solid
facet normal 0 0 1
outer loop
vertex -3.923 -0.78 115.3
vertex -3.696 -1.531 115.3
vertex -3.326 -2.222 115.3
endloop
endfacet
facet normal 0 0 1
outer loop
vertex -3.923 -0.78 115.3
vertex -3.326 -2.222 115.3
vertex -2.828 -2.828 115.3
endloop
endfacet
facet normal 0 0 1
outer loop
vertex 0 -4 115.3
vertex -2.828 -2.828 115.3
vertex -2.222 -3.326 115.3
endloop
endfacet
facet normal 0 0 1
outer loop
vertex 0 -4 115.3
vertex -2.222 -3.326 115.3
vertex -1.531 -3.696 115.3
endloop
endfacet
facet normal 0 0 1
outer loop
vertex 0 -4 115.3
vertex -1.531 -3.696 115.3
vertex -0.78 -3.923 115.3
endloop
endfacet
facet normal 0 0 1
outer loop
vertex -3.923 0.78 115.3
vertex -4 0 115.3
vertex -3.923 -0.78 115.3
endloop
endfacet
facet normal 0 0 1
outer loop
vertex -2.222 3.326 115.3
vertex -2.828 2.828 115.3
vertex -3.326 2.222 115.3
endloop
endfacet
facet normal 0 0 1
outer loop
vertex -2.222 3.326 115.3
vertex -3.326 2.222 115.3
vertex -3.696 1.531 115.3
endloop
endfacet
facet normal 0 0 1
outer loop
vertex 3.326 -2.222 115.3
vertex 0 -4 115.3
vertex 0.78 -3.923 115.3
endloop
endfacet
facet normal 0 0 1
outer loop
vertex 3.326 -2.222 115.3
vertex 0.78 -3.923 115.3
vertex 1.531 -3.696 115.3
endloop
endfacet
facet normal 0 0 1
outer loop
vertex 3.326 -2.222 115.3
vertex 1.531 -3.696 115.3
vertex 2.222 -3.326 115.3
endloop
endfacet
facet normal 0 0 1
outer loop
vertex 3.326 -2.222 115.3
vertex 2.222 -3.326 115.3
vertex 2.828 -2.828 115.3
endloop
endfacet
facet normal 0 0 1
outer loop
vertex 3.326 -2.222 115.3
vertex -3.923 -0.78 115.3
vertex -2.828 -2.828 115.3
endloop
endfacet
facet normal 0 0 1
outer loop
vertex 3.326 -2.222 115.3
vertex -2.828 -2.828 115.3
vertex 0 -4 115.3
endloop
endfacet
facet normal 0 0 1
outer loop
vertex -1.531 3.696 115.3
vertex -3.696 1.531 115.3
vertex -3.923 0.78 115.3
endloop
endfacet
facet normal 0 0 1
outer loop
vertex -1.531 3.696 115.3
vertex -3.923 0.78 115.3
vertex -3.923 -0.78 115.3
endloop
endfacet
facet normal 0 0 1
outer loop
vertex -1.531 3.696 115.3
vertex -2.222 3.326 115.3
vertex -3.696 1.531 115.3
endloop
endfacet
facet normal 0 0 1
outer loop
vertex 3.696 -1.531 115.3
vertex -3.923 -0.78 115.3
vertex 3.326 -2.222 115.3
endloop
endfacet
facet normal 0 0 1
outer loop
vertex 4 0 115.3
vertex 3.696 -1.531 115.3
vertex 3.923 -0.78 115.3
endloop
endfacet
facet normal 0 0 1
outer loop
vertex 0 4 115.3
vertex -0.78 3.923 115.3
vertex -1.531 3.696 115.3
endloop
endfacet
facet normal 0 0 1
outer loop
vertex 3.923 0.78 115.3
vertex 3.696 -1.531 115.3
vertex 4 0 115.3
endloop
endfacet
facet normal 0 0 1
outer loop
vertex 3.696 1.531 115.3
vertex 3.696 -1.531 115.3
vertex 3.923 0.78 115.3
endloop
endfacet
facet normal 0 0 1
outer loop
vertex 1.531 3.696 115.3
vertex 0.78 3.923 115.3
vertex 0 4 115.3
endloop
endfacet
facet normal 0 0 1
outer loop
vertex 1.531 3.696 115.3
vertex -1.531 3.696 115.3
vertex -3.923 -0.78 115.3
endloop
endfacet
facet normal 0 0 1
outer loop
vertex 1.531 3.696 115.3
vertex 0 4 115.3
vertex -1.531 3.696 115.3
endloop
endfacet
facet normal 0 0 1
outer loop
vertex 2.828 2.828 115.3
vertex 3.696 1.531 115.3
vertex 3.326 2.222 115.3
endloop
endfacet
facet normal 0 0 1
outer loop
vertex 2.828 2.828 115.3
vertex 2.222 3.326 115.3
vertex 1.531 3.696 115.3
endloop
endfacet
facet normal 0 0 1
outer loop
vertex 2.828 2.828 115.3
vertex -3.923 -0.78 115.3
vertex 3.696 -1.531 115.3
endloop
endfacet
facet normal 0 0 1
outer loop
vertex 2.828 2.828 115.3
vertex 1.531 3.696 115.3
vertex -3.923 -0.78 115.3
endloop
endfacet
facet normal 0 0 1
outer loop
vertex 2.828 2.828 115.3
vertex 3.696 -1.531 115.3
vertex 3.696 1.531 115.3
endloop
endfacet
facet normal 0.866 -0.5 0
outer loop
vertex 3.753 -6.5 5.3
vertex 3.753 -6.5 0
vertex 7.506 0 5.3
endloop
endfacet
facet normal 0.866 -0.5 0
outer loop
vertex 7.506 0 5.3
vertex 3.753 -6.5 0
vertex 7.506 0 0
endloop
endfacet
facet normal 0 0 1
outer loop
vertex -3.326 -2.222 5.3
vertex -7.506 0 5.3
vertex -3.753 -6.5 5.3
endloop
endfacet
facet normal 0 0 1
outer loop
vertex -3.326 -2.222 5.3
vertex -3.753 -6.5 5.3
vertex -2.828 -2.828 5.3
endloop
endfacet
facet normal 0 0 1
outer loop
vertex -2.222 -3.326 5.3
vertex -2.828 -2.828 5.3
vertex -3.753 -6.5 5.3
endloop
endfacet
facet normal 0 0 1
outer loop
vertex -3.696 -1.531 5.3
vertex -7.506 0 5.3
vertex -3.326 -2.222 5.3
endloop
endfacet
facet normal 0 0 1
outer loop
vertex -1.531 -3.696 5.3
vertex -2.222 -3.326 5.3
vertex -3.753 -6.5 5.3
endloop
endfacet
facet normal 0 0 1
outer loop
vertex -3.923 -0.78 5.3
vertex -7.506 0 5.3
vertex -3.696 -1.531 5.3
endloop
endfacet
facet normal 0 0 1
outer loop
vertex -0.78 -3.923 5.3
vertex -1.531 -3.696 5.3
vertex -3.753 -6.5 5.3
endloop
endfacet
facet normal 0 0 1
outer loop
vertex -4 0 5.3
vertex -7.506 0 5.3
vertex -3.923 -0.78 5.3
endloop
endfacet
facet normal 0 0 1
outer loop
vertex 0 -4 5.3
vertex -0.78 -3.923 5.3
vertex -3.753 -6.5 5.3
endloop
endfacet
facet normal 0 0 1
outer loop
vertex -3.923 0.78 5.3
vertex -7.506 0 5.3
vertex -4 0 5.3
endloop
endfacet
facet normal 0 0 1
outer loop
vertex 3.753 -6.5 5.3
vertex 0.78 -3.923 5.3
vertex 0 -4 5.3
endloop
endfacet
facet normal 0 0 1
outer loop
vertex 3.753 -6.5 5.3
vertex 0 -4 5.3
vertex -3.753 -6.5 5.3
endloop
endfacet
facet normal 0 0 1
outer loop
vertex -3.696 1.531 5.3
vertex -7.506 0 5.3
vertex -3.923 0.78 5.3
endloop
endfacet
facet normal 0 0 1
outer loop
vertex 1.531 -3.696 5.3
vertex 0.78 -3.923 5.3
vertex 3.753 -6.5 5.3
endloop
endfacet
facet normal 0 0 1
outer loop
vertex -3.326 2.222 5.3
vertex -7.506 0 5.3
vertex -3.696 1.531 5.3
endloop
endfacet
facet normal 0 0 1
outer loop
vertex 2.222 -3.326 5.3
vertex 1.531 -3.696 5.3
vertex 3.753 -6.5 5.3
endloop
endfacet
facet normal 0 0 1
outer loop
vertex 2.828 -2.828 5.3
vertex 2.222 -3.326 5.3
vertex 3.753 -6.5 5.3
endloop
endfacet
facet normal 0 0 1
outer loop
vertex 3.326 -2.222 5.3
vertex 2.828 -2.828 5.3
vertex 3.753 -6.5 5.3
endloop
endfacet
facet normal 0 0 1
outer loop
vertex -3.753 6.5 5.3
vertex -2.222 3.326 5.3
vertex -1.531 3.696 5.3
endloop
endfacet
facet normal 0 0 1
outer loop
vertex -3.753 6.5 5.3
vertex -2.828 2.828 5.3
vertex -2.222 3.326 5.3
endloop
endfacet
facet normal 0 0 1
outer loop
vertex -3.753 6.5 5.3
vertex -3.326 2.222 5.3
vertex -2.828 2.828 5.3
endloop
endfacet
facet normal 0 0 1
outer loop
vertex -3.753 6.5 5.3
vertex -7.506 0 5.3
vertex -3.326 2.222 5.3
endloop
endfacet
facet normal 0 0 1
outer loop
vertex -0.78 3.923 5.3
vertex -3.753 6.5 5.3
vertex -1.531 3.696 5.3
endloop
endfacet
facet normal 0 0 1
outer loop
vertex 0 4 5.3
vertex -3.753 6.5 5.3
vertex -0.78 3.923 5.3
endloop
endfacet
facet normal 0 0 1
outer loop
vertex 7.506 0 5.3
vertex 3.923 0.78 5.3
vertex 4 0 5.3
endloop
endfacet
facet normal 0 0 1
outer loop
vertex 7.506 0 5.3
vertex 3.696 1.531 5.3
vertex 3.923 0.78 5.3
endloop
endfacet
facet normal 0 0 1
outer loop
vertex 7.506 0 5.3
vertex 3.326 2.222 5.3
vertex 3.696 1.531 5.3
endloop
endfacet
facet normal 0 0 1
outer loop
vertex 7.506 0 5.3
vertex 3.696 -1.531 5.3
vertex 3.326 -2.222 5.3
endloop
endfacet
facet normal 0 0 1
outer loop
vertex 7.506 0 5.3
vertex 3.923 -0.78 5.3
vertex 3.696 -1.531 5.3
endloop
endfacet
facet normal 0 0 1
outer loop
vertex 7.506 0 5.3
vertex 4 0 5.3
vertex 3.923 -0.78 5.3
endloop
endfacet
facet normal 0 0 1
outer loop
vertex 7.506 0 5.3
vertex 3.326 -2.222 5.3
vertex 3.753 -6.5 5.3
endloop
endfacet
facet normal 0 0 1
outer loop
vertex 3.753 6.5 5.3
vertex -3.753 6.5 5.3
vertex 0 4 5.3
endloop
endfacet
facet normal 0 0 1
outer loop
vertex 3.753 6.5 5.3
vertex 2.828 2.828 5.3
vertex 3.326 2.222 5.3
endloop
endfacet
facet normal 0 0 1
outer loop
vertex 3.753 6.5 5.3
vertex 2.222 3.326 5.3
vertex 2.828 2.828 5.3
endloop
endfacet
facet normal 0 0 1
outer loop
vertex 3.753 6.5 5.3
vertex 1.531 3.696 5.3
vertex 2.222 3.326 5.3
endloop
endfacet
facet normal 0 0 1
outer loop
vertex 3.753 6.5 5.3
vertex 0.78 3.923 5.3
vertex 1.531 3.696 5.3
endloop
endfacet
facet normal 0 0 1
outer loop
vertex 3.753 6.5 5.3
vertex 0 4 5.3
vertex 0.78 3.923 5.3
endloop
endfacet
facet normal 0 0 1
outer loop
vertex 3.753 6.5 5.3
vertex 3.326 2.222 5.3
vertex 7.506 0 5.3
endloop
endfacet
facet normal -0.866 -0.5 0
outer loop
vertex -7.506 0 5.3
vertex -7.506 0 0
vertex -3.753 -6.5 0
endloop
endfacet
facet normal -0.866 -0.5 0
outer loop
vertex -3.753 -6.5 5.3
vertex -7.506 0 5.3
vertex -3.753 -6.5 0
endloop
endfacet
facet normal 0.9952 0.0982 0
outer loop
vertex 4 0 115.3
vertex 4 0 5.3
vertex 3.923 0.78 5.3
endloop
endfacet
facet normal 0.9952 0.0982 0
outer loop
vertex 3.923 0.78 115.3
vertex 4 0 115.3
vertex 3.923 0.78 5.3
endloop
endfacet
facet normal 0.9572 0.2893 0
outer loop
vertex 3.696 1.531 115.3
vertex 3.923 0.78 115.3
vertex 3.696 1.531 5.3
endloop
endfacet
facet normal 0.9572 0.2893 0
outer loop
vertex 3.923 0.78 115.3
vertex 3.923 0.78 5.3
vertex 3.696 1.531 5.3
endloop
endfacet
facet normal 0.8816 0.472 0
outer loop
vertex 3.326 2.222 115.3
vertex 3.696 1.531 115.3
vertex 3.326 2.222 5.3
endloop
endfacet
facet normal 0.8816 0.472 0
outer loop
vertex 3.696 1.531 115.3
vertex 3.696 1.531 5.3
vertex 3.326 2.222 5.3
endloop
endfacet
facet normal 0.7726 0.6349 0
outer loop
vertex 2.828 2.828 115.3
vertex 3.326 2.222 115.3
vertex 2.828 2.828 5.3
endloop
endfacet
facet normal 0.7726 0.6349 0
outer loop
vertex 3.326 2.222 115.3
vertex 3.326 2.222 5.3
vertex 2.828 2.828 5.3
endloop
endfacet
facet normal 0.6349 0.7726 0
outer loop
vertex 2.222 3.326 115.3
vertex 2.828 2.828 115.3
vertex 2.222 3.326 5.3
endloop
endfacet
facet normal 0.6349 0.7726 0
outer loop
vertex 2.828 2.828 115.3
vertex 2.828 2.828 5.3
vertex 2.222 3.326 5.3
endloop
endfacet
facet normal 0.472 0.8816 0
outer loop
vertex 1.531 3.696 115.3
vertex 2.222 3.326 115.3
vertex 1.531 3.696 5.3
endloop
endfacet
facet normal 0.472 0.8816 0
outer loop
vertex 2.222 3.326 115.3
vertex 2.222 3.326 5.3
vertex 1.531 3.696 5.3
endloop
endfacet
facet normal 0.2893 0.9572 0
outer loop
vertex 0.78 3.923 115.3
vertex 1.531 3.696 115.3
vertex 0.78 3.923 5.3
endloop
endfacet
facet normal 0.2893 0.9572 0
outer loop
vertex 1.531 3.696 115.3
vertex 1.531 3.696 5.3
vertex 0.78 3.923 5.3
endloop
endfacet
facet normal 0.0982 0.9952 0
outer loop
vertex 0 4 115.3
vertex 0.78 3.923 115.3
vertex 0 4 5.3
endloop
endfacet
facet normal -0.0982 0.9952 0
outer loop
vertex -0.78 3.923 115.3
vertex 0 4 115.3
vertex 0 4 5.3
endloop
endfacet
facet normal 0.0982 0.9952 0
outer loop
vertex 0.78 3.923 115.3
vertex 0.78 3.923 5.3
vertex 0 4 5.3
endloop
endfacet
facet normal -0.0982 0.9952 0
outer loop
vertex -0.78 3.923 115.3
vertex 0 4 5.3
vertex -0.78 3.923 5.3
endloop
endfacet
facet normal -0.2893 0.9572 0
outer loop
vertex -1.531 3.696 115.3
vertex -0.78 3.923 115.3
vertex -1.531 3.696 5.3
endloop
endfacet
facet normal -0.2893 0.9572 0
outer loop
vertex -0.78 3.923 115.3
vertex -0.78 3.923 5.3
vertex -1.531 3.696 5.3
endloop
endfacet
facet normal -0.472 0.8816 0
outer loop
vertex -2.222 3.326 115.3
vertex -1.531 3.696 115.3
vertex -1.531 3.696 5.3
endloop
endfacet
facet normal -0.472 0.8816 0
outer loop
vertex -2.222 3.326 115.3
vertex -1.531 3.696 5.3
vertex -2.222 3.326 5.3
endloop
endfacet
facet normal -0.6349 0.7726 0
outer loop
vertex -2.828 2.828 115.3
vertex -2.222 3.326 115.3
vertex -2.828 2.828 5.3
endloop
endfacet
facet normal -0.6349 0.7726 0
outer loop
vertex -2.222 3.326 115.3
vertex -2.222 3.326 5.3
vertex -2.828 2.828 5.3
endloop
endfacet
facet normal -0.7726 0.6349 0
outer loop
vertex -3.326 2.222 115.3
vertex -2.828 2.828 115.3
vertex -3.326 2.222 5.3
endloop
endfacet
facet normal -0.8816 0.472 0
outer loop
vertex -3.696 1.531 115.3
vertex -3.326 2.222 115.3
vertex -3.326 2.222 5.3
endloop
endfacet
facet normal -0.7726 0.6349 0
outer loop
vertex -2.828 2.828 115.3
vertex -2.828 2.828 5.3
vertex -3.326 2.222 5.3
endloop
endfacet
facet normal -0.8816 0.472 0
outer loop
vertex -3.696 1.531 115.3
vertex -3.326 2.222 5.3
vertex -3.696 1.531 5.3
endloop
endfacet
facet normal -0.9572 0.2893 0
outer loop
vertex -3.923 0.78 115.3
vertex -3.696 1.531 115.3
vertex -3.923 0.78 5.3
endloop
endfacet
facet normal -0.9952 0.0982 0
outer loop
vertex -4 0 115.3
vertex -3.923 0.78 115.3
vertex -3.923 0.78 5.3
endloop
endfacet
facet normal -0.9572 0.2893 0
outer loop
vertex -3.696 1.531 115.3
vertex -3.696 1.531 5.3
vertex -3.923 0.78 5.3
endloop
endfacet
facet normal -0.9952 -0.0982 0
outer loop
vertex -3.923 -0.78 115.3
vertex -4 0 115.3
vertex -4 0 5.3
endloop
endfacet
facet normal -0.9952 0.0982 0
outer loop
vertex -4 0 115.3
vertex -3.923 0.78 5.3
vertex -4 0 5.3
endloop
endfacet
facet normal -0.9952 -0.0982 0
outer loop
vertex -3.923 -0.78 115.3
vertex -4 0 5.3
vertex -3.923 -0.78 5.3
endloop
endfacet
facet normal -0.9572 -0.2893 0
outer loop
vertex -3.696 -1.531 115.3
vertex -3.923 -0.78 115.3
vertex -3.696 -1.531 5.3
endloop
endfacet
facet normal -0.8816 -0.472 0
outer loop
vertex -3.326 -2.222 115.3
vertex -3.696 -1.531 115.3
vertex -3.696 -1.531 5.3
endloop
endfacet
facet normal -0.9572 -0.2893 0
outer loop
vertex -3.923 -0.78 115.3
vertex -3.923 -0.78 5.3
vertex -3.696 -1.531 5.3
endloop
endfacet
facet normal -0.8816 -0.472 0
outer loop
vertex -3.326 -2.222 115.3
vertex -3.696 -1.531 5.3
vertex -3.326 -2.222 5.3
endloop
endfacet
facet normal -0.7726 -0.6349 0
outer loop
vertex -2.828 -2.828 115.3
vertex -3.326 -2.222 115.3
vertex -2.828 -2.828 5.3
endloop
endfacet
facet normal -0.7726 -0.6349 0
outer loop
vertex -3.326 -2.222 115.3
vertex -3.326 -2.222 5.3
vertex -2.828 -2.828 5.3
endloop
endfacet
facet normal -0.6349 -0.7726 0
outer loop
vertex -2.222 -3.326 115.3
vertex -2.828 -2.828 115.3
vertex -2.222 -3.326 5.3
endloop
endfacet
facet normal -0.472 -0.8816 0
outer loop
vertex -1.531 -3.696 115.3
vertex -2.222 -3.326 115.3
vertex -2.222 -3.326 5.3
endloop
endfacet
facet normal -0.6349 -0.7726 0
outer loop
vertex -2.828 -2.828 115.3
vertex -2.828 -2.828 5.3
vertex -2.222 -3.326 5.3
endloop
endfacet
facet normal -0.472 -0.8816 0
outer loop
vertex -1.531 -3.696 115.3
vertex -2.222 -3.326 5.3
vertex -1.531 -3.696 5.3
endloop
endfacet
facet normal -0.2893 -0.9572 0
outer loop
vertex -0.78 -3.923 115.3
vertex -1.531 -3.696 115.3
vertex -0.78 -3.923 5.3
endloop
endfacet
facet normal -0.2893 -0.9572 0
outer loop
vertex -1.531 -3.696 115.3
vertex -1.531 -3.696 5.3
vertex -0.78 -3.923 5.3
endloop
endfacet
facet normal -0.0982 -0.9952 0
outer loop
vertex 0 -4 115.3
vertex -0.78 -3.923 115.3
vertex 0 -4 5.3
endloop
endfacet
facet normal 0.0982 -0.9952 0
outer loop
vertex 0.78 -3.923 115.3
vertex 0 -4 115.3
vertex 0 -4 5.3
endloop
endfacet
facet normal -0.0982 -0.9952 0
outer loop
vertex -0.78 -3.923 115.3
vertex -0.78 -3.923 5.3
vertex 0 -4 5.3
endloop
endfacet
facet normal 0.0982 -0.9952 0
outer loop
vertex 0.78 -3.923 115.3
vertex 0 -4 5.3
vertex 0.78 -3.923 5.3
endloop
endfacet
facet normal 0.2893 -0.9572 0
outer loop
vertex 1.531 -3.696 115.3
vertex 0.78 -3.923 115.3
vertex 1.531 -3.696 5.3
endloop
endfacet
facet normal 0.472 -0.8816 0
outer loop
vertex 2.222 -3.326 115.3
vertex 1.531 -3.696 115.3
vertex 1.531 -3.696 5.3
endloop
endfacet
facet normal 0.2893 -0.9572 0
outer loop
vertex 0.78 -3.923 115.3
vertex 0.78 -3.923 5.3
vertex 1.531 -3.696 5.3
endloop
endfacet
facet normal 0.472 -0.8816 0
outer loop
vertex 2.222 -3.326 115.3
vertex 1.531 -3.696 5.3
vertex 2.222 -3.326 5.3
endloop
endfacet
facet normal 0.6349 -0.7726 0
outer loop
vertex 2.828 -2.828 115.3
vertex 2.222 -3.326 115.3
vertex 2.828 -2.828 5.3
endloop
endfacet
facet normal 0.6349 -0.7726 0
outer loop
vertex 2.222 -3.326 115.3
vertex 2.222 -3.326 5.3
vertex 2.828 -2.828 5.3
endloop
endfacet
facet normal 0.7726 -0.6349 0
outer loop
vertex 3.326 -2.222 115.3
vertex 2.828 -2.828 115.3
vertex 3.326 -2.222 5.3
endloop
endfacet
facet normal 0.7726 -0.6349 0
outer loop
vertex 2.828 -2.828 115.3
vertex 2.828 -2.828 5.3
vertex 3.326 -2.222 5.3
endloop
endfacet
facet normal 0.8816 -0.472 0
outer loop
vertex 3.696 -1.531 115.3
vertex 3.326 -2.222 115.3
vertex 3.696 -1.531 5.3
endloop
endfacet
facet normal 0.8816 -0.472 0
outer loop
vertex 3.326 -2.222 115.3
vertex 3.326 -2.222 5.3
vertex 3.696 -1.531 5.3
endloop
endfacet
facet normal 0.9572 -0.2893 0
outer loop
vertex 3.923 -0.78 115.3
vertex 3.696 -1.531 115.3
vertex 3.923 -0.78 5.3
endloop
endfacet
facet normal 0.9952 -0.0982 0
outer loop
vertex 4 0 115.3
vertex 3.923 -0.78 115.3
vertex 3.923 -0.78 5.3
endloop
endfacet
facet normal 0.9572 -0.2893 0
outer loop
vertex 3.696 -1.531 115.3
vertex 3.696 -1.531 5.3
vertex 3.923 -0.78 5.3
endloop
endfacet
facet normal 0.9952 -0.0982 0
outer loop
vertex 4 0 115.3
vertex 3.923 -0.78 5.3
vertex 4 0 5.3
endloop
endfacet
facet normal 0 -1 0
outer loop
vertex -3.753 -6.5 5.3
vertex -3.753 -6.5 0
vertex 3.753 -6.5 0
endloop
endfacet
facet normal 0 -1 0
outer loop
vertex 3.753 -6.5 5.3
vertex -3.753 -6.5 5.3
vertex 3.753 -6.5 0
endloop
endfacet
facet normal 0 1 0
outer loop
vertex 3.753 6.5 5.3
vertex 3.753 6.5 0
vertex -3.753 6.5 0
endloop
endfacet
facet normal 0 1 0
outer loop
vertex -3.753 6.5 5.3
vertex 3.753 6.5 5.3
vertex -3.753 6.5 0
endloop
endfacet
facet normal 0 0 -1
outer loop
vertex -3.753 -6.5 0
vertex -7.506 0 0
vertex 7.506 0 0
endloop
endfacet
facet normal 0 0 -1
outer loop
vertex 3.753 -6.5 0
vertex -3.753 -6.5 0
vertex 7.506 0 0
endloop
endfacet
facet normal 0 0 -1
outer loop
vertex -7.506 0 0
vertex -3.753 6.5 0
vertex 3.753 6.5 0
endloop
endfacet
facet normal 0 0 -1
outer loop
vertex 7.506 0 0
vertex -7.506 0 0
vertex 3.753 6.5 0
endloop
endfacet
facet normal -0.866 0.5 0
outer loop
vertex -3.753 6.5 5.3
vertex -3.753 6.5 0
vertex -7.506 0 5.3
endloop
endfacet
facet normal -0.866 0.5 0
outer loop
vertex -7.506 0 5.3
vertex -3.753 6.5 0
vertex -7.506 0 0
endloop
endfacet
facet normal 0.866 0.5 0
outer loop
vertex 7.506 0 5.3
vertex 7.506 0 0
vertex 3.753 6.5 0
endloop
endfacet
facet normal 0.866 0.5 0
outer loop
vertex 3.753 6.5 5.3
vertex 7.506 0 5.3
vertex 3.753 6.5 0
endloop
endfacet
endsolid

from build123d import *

# Parameters (mm, degrees)
BASE_EXTRUDE_DEPTH  = 5.3
SKETCH2_R           = 4
BOSS_EXTRUDE1_DEPTH = 110


with BuildPart() as part:
    # Sketch1 → Base-Extrude (new body)
    with BuildSketch(Plane.XY):
        Polygon((7.505553499, 0), (3.75277675, 6.5), (-3.75277675, 6.5), (-7.505553499, 0), (-3.75277675, -6.5), (3.75277675, -6.5), align=None)
    extrude(amount=BASE_EXTRUDE_DEPTH)

    # Sketch2 → Boss-Extrude1 (add)
    with BuildSketch(Plane.XY.offset(5.3)):
        Circle(SKETCH2_R)
    extrude(amount=BOSS_EXTRUDE1_DEPTH)


solid = part.part
